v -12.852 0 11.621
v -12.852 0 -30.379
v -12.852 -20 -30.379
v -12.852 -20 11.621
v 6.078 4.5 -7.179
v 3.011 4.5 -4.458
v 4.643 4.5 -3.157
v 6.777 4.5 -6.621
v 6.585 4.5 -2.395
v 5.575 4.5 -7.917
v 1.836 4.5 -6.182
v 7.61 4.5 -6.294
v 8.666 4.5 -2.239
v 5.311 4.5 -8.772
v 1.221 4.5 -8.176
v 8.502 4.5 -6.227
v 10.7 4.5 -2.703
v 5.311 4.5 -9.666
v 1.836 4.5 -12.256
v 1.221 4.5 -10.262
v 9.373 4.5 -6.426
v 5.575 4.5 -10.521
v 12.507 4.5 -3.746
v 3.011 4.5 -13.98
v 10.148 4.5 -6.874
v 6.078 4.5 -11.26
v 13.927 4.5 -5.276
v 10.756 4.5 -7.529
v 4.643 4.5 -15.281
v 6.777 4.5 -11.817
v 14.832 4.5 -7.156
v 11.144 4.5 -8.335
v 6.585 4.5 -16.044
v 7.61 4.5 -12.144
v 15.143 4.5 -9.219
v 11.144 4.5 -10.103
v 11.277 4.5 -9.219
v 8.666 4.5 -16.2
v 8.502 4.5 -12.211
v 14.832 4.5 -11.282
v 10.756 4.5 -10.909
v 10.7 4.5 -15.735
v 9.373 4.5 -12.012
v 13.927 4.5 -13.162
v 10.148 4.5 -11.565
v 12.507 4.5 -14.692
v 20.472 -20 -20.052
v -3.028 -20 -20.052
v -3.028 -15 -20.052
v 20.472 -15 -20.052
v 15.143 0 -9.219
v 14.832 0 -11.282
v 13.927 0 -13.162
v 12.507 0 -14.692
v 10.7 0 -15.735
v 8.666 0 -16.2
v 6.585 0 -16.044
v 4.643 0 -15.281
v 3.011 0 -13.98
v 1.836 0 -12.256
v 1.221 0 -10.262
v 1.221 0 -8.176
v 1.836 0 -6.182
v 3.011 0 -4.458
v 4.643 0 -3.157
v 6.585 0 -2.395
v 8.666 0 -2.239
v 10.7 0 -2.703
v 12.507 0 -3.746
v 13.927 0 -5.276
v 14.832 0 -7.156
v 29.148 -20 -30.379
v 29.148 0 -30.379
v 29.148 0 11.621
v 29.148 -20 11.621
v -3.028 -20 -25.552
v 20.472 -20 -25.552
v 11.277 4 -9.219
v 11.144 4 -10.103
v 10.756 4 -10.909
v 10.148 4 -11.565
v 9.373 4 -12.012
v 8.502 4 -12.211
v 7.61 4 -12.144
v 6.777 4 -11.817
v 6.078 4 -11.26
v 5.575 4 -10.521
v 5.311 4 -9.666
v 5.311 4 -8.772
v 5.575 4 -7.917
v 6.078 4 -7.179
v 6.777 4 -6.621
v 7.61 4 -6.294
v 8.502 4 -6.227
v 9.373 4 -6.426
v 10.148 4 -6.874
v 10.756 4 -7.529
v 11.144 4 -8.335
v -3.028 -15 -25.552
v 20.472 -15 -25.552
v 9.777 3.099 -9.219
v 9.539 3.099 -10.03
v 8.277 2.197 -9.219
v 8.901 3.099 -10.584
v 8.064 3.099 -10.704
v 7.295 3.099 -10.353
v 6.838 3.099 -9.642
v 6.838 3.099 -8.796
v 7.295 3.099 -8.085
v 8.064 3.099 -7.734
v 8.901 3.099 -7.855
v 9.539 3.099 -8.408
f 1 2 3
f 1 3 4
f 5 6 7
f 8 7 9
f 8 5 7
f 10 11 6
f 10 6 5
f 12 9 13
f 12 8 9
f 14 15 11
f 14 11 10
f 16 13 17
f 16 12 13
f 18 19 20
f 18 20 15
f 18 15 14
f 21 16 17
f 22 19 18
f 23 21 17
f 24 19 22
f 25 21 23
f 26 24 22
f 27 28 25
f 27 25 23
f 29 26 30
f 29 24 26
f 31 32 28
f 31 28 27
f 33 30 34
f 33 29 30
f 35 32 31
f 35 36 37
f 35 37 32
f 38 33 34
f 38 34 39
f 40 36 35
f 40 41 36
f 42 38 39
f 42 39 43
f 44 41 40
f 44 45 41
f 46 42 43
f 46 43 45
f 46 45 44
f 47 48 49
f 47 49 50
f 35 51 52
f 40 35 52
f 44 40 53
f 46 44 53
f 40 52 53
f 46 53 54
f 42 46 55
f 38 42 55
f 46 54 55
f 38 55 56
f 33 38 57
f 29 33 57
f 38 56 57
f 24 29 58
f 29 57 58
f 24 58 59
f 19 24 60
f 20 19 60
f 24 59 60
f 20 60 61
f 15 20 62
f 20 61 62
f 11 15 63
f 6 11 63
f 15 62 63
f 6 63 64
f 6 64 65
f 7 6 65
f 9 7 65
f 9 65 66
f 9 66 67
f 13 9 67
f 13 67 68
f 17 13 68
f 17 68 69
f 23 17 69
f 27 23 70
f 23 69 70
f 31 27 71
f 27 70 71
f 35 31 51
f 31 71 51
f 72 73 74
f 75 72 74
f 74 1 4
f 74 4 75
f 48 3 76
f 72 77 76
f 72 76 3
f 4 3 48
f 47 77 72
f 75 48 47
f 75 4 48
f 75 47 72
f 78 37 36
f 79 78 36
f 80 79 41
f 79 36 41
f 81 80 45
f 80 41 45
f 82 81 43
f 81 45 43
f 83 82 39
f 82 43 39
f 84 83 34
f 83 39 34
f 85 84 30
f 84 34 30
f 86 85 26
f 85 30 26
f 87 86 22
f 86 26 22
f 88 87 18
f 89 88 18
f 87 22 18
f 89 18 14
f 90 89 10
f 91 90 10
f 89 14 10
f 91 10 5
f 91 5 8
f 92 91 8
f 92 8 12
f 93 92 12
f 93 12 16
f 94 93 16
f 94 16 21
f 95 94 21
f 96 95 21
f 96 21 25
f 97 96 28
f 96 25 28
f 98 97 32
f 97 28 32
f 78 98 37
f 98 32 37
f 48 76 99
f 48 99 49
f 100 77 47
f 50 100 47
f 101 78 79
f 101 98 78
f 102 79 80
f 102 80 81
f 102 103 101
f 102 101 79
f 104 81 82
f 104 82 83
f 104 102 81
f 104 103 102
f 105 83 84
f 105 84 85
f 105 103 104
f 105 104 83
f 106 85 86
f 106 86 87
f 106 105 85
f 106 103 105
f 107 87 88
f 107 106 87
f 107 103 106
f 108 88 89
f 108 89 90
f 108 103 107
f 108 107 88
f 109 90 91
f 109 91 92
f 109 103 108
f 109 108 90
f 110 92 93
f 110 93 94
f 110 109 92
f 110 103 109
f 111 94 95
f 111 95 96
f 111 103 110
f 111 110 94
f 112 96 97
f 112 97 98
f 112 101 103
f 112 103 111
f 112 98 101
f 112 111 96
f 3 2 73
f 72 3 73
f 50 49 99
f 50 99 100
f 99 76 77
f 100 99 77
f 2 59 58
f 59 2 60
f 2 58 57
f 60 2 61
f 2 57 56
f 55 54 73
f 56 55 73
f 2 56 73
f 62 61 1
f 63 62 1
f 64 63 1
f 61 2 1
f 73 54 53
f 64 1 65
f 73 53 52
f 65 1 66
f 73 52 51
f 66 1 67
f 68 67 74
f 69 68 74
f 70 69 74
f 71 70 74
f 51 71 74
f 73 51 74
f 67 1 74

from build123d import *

# Parameters (mm, degrees)
SKETCH_W     = 42
SKETCH_H     = 42
PAD_DEPTH    = 20
SKETCH001_R  = 7
PAD001_DEPTH = 4.5
SKETCH002_R  = 3
HOLE_DEPTH   = 0.5
HOLE_TIPS_R  = 3
SKETCH003_W  = 23.5
SKETCH003_H  = 5.5
POCKET_DEPTH = 5


with BuildPart() as part:
    # Sketch → Pad (new body)
    with BuildSketch(Plane.XZ):
        with Locations((8.147526, -9.378734)):
            Rectangle(SKETCH_W, SKETCH_H)
    extrude(amount=PAD_DEPTH)

    # Sketch001 (on Face5 of Pad) → Pad001 (join)
    with BuildSketch(Plane(origin=(0, 0, 0), x_dir=(1, 0, 0), z_dir=(0, 1, 0))):
        with Locations((8.142856, 9.219142)):
            Circle(SKETCH001_R)
    extrude(amount=PAD001_DEPTH)

    # Sketch002 (on Face8 of Pad001) → Hole (cut)
    with BuildSketch(Plane(origin=(0, 4.5, 0), x_dir=(1, 0, 0), z_dir=(0, 1, 0))):
        with Locations((8.27745, 9.219093)):
            Circle(SKETCH002_R)
    extrude(amount=-HOLE_DEPTH, mode=Mode.SUBTRACT)

    # Hole tips → Hole tip 1 section 0
    with BuildSketch(Plane(origin=(0, 4, 0), x_dir=(1, 0, 0), z_dir=(0, 1, 0)), mode=Mode.PRIVATE) as hole_tip_1_s0:
        with Locations((8.27745, 9.219093)):
            Circle(HOLE_TIPS_R)
    loft([hole_tip_1_s0.sketch, Vertex(8.27745, 2.197418, -9.219093)], mode=Mode.SUBTRACT)

    # Sketch003 (on Face5 of Hole) → Pocket (cut)
    with BuildSketch(Plane.XZ.offset(20)):
        with Locations((8.721823, -22.801634)):
            Rectangle(SKETCH003_W, SKETCH003_H)
    extrude(amount=-POCKET_DEPTH, mode=Mode.SUBTRACT)


solid = part.part
